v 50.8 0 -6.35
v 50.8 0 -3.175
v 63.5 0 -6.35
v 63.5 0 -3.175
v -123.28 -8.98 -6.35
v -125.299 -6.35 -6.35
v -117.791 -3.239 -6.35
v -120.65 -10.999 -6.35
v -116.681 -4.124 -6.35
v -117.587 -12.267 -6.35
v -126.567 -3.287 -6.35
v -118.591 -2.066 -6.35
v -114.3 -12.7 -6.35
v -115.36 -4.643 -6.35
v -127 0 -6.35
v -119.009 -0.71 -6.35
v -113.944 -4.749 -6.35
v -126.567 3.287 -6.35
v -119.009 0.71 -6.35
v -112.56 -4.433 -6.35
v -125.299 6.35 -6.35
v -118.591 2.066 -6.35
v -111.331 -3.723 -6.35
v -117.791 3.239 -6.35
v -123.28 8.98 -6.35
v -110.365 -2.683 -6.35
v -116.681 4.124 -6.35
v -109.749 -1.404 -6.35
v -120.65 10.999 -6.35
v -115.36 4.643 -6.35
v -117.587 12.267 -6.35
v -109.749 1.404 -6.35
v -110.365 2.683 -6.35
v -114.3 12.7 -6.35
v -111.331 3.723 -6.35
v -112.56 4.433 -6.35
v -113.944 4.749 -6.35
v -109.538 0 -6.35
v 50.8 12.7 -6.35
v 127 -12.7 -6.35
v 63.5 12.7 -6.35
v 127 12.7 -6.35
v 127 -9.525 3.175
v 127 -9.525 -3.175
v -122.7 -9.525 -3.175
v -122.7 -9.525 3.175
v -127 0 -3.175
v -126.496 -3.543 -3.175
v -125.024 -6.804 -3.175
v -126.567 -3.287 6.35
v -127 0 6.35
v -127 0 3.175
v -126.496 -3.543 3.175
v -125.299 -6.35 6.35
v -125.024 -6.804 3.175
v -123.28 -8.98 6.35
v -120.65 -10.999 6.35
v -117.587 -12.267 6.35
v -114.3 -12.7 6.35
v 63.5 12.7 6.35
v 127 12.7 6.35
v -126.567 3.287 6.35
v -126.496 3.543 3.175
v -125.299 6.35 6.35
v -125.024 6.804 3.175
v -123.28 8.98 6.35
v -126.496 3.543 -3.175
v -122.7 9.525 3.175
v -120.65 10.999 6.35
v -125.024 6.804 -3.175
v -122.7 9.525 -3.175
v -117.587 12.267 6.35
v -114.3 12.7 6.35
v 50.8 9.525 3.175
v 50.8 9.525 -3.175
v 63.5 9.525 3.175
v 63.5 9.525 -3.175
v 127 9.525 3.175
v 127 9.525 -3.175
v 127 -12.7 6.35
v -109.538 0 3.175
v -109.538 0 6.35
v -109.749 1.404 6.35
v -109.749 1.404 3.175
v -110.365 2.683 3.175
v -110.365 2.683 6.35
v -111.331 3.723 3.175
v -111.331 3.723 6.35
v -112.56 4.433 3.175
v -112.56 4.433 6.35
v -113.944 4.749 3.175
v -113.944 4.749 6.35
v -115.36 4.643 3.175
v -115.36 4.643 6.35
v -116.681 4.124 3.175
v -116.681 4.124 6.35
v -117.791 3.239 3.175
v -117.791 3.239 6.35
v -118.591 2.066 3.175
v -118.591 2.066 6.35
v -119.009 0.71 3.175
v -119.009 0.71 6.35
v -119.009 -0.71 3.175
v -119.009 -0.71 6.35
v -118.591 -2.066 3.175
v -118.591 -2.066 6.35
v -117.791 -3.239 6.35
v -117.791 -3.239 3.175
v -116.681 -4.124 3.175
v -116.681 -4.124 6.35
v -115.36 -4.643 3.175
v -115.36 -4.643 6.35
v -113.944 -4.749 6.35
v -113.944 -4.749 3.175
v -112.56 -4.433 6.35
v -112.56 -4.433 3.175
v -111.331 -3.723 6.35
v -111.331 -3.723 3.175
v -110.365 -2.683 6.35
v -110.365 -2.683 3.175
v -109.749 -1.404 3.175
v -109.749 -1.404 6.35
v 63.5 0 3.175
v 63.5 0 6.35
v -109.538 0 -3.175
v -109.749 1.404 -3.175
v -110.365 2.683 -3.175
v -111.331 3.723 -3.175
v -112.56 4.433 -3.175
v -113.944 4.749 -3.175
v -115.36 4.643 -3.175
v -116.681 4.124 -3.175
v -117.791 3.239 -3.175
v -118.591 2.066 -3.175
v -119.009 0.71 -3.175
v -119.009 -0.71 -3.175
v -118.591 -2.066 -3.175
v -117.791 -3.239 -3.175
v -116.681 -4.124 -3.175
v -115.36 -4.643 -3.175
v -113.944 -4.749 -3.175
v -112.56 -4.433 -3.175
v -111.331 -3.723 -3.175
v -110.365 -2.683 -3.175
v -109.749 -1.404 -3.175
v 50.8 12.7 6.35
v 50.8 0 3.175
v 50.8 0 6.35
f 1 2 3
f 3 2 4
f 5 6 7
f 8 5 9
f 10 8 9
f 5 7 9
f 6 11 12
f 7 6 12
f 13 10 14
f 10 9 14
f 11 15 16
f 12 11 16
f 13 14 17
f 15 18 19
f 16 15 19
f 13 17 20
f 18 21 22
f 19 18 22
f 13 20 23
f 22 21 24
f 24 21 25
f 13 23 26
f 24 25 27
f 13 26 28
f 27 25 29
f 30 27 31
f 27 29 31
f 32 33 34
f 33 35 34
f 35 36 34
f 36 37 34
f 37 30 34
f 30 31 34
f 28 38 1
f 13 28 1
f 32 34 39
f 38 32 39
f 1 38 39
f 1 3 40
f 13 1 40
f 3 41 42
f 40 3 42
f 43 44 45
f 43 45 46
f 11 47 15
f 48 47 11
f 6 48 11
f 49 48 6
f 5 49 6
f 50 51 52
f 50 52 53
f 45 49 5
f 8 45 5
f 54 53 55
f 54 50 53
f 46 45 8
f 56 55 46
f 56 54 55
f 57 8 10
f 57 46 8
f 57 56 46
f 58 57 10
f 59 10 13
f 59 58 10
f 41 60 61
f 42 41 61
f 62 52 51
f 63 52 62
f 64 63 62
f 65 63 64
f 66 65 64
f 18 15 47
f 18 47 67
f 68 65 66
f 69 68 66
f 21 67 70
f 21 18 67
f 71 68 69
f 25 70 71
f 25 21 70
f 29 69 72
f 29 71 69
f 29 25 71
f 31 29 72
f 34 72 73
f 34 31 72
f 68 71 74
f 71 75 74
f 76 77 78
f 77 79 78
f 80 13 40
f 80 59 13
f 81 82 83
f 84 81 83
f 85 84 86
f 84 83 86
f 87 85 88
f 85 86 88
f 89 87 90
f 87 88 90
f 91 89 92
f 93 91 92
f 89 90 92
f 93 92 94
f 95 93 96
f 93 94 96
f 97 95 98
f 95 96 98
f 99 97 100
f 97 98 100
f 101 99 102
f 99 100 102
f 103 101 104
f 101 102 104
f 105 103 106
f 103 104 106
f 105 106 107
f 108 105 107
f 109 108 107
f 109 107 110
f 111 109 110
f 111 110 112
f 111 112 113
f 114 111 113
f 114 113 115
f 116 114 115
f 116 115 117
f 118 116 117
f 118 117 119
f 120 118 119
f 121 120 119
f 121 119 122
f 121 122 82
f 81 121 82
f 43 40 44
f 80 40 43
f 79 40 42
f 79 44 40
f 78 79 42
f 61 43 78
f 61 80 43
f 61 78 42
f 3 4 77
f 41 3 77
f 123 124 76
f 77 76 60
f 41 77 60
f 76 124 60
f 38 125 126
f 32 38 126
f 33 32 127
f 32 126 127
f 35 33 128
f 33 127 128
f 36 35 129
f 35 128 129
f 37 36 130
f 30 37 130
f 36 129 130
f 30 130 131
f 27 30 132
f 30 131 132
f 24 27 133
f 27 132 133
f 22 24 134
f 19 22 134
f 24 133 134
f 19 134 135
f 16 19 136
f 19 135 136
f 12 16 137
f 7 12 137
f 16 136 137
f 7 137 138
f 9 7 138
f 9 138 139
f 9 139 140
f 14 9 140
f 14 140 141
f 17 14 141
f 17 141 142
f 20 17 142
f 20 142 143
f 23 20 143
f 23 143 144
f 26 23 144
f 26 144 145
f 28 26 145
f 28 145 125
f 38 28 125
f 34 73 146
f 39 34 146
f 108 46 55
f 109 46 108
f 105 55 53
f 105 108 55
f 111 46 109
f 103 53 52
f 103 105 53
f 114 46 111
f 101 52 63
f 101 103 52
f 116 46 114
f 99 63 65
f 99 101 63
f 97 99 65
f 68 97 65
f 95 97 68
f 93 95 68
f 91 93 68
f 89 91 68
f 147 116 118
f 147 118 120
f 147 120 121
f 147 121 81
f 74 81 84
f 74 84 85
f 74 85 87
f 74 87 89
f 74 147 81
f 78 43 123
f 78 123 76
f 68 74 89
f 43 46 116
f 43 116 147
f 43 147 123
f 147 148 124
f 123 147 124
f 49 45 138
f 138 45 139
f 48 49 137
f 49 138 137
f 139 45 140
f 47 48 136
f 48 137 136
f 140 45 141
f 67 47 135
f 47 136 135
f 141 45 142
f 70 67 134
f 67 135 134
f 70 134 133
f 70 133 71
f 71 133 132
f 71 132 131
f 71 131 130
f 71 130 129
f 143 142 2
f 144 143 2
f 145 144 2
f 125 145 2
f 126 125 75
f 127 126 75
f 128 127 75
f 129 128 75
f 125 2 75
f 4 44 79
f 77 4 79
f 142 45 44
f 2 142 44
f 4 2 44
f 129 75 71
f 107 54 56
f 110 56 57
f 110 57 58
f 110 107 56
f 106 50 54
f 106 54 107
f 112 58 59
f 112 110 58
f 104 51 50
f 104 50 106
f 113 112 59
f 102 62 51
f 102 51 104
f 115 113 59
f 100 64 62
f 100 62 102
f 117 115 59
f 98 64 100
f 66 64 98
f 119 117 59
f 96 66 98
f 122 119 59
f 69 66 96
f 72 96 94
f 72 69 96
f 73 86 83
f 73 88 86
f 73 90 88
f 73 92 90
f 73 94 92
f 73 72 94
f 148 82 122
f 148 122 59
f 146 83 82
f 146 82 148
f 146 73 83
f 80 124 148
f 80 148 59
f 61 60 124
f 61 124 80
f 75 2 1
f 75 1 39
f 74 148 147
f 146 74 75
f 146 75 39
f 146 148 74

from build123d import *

# Parameters (mm, degrees)
F0_W          = 254
F0_H          = 25.4
F1_DEPTH      = 6.35
F2_R          = 12.69999
F3_R          = 4.7625
F4_DEPTH      = 12.701
F5_W          = 19.05
F5_H          = 6.35
F6_DEPTH      = 127.001
F6_DEPTH_BACK = 127.001
F7_W          = 12.7
F7_H          = 12.7
F8_DEPTH      = 12.701


# Not quite as in the source:
# - a fillet or chamfer is up to 0.001 mm smaller than in the source, because OpenCascade refuses the exact size


with BuildPart() as f1:
    # F0 (on Top) → F1 (new body, symmetric)
    with BuildSketch(Plane.XY):
        Rectangle(F0_W, F0_H)
    extrude(amount=F1_DEPTH, both=True)

    # F2 (radius 12.7 in the source; OpenCascade refuses exactly that, so slightly less here)
    f2_edges = [f1.edges().sort_by_distance(p)[0] for p in [
        (-127, 12.7, 0),
        (-127, -12.7, 0),
    ]]
    fillet(f2_edges, radius=F2_R)

    # F3 (on face) → F4 (cut, through all)
    with BuildSketch(Plane.XY.offset(6.35)):
        with Locations((-114.3, 0)):
            Circle(F3_R)
    extrude(amount=-F4_DEPTH, mode=Mode.SUBTRACT)

    # F5 (on Right) → F6 (cut, two sides)
    with BuildSketch(Plane.YZ) as f6_sk:
        Rectangle(F5_W, F5_H)
    extrude(amount=-F6_DEPTH, mode=Mode.SUBTRACT)
    extrude(f6_sk.sketch, amount=F6_DEPTH_BACK, mode=Mode.SUBTRACT)

    # F7 (on face) → F8 (cut, through all)
    with BuildSketch(Plane.XY.offset(6.35)):
        with Locations((57.15, 6.35)):
            Rectangle(F7_W, F7_H)
    extrude(amount=-F8_DEPTH, mode=Mode.SUBTRACT)


solid = f1.part
